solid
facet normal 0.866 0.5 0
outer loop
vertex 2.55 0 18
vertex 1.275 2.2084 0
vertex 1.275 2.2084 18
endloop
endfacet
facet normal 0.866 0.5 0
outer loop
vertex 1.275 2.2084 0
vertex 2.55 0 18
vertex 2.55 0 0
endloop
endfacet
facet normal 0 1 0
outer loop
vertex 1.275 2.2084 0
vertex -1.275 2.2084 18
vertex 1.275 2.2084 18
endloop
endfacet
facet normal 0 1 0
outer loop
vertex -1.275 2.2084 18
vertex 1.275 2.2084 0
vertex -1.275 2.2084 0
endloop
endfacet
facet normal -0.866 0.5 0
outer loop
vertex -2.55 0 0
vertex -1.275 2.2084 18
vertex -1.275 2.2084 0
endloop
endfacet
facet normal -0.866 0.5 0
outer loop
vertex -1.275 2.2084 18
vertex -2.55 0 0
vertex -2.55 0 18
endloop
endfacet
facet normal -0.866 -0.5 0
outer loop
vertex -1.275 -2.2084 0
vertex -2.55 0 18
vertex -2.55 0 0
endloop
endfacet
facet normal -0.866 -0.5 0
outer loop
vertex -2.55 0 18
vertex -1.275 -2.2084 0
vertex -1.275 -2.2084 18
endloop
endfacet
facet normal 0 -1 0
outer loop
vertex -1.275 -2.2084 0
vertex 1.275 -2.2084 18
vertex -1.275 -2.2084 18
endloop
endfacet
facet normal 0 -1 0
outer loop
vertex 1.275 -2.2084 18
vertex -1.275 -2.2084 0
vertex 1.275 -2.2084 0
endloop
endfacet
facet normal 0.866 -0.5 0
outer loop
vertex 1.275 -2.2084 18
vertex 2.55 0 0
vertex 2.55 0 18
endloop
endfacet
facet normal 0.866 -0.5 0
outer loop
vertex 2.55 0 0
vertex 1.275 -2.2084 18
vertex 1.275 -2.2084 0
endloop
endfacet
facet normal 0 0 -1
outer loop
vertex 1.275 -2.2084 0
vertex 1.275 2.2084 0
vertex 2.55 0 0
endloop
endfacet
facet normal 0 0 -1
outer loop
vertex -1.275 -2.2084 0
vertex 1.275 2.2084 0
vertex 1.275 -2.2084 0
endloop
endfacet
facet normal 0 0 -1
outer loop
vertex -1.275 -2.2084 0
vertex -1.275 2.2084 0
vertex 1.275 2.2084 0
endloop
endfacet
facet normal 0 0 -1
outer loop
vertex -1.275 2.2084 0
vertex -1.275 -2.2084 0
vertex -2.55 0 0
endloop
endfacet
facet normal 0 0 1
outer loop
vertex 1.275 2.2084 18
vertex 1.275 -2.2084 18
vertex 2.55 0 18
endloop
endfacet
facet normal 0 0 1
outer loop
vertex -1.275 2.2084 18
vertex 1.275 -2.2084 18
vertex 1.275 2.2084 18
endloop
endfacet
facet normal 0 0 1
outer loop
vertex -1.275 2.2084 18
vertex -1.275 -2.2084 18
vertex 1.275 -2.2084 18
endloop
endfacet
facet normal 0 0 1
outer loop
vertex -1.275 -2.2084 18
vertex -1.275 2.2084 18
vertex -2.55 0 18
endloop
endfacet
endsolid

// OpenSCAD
// standoffs
// 0.698"/17.7mm
// d1 = 0.180"/4.6mm
// d2 = 0.020"/5.1mm

// 0.708"/18.0mm
cylinder(h=18.0,r=5.1/2,$fn=6);
